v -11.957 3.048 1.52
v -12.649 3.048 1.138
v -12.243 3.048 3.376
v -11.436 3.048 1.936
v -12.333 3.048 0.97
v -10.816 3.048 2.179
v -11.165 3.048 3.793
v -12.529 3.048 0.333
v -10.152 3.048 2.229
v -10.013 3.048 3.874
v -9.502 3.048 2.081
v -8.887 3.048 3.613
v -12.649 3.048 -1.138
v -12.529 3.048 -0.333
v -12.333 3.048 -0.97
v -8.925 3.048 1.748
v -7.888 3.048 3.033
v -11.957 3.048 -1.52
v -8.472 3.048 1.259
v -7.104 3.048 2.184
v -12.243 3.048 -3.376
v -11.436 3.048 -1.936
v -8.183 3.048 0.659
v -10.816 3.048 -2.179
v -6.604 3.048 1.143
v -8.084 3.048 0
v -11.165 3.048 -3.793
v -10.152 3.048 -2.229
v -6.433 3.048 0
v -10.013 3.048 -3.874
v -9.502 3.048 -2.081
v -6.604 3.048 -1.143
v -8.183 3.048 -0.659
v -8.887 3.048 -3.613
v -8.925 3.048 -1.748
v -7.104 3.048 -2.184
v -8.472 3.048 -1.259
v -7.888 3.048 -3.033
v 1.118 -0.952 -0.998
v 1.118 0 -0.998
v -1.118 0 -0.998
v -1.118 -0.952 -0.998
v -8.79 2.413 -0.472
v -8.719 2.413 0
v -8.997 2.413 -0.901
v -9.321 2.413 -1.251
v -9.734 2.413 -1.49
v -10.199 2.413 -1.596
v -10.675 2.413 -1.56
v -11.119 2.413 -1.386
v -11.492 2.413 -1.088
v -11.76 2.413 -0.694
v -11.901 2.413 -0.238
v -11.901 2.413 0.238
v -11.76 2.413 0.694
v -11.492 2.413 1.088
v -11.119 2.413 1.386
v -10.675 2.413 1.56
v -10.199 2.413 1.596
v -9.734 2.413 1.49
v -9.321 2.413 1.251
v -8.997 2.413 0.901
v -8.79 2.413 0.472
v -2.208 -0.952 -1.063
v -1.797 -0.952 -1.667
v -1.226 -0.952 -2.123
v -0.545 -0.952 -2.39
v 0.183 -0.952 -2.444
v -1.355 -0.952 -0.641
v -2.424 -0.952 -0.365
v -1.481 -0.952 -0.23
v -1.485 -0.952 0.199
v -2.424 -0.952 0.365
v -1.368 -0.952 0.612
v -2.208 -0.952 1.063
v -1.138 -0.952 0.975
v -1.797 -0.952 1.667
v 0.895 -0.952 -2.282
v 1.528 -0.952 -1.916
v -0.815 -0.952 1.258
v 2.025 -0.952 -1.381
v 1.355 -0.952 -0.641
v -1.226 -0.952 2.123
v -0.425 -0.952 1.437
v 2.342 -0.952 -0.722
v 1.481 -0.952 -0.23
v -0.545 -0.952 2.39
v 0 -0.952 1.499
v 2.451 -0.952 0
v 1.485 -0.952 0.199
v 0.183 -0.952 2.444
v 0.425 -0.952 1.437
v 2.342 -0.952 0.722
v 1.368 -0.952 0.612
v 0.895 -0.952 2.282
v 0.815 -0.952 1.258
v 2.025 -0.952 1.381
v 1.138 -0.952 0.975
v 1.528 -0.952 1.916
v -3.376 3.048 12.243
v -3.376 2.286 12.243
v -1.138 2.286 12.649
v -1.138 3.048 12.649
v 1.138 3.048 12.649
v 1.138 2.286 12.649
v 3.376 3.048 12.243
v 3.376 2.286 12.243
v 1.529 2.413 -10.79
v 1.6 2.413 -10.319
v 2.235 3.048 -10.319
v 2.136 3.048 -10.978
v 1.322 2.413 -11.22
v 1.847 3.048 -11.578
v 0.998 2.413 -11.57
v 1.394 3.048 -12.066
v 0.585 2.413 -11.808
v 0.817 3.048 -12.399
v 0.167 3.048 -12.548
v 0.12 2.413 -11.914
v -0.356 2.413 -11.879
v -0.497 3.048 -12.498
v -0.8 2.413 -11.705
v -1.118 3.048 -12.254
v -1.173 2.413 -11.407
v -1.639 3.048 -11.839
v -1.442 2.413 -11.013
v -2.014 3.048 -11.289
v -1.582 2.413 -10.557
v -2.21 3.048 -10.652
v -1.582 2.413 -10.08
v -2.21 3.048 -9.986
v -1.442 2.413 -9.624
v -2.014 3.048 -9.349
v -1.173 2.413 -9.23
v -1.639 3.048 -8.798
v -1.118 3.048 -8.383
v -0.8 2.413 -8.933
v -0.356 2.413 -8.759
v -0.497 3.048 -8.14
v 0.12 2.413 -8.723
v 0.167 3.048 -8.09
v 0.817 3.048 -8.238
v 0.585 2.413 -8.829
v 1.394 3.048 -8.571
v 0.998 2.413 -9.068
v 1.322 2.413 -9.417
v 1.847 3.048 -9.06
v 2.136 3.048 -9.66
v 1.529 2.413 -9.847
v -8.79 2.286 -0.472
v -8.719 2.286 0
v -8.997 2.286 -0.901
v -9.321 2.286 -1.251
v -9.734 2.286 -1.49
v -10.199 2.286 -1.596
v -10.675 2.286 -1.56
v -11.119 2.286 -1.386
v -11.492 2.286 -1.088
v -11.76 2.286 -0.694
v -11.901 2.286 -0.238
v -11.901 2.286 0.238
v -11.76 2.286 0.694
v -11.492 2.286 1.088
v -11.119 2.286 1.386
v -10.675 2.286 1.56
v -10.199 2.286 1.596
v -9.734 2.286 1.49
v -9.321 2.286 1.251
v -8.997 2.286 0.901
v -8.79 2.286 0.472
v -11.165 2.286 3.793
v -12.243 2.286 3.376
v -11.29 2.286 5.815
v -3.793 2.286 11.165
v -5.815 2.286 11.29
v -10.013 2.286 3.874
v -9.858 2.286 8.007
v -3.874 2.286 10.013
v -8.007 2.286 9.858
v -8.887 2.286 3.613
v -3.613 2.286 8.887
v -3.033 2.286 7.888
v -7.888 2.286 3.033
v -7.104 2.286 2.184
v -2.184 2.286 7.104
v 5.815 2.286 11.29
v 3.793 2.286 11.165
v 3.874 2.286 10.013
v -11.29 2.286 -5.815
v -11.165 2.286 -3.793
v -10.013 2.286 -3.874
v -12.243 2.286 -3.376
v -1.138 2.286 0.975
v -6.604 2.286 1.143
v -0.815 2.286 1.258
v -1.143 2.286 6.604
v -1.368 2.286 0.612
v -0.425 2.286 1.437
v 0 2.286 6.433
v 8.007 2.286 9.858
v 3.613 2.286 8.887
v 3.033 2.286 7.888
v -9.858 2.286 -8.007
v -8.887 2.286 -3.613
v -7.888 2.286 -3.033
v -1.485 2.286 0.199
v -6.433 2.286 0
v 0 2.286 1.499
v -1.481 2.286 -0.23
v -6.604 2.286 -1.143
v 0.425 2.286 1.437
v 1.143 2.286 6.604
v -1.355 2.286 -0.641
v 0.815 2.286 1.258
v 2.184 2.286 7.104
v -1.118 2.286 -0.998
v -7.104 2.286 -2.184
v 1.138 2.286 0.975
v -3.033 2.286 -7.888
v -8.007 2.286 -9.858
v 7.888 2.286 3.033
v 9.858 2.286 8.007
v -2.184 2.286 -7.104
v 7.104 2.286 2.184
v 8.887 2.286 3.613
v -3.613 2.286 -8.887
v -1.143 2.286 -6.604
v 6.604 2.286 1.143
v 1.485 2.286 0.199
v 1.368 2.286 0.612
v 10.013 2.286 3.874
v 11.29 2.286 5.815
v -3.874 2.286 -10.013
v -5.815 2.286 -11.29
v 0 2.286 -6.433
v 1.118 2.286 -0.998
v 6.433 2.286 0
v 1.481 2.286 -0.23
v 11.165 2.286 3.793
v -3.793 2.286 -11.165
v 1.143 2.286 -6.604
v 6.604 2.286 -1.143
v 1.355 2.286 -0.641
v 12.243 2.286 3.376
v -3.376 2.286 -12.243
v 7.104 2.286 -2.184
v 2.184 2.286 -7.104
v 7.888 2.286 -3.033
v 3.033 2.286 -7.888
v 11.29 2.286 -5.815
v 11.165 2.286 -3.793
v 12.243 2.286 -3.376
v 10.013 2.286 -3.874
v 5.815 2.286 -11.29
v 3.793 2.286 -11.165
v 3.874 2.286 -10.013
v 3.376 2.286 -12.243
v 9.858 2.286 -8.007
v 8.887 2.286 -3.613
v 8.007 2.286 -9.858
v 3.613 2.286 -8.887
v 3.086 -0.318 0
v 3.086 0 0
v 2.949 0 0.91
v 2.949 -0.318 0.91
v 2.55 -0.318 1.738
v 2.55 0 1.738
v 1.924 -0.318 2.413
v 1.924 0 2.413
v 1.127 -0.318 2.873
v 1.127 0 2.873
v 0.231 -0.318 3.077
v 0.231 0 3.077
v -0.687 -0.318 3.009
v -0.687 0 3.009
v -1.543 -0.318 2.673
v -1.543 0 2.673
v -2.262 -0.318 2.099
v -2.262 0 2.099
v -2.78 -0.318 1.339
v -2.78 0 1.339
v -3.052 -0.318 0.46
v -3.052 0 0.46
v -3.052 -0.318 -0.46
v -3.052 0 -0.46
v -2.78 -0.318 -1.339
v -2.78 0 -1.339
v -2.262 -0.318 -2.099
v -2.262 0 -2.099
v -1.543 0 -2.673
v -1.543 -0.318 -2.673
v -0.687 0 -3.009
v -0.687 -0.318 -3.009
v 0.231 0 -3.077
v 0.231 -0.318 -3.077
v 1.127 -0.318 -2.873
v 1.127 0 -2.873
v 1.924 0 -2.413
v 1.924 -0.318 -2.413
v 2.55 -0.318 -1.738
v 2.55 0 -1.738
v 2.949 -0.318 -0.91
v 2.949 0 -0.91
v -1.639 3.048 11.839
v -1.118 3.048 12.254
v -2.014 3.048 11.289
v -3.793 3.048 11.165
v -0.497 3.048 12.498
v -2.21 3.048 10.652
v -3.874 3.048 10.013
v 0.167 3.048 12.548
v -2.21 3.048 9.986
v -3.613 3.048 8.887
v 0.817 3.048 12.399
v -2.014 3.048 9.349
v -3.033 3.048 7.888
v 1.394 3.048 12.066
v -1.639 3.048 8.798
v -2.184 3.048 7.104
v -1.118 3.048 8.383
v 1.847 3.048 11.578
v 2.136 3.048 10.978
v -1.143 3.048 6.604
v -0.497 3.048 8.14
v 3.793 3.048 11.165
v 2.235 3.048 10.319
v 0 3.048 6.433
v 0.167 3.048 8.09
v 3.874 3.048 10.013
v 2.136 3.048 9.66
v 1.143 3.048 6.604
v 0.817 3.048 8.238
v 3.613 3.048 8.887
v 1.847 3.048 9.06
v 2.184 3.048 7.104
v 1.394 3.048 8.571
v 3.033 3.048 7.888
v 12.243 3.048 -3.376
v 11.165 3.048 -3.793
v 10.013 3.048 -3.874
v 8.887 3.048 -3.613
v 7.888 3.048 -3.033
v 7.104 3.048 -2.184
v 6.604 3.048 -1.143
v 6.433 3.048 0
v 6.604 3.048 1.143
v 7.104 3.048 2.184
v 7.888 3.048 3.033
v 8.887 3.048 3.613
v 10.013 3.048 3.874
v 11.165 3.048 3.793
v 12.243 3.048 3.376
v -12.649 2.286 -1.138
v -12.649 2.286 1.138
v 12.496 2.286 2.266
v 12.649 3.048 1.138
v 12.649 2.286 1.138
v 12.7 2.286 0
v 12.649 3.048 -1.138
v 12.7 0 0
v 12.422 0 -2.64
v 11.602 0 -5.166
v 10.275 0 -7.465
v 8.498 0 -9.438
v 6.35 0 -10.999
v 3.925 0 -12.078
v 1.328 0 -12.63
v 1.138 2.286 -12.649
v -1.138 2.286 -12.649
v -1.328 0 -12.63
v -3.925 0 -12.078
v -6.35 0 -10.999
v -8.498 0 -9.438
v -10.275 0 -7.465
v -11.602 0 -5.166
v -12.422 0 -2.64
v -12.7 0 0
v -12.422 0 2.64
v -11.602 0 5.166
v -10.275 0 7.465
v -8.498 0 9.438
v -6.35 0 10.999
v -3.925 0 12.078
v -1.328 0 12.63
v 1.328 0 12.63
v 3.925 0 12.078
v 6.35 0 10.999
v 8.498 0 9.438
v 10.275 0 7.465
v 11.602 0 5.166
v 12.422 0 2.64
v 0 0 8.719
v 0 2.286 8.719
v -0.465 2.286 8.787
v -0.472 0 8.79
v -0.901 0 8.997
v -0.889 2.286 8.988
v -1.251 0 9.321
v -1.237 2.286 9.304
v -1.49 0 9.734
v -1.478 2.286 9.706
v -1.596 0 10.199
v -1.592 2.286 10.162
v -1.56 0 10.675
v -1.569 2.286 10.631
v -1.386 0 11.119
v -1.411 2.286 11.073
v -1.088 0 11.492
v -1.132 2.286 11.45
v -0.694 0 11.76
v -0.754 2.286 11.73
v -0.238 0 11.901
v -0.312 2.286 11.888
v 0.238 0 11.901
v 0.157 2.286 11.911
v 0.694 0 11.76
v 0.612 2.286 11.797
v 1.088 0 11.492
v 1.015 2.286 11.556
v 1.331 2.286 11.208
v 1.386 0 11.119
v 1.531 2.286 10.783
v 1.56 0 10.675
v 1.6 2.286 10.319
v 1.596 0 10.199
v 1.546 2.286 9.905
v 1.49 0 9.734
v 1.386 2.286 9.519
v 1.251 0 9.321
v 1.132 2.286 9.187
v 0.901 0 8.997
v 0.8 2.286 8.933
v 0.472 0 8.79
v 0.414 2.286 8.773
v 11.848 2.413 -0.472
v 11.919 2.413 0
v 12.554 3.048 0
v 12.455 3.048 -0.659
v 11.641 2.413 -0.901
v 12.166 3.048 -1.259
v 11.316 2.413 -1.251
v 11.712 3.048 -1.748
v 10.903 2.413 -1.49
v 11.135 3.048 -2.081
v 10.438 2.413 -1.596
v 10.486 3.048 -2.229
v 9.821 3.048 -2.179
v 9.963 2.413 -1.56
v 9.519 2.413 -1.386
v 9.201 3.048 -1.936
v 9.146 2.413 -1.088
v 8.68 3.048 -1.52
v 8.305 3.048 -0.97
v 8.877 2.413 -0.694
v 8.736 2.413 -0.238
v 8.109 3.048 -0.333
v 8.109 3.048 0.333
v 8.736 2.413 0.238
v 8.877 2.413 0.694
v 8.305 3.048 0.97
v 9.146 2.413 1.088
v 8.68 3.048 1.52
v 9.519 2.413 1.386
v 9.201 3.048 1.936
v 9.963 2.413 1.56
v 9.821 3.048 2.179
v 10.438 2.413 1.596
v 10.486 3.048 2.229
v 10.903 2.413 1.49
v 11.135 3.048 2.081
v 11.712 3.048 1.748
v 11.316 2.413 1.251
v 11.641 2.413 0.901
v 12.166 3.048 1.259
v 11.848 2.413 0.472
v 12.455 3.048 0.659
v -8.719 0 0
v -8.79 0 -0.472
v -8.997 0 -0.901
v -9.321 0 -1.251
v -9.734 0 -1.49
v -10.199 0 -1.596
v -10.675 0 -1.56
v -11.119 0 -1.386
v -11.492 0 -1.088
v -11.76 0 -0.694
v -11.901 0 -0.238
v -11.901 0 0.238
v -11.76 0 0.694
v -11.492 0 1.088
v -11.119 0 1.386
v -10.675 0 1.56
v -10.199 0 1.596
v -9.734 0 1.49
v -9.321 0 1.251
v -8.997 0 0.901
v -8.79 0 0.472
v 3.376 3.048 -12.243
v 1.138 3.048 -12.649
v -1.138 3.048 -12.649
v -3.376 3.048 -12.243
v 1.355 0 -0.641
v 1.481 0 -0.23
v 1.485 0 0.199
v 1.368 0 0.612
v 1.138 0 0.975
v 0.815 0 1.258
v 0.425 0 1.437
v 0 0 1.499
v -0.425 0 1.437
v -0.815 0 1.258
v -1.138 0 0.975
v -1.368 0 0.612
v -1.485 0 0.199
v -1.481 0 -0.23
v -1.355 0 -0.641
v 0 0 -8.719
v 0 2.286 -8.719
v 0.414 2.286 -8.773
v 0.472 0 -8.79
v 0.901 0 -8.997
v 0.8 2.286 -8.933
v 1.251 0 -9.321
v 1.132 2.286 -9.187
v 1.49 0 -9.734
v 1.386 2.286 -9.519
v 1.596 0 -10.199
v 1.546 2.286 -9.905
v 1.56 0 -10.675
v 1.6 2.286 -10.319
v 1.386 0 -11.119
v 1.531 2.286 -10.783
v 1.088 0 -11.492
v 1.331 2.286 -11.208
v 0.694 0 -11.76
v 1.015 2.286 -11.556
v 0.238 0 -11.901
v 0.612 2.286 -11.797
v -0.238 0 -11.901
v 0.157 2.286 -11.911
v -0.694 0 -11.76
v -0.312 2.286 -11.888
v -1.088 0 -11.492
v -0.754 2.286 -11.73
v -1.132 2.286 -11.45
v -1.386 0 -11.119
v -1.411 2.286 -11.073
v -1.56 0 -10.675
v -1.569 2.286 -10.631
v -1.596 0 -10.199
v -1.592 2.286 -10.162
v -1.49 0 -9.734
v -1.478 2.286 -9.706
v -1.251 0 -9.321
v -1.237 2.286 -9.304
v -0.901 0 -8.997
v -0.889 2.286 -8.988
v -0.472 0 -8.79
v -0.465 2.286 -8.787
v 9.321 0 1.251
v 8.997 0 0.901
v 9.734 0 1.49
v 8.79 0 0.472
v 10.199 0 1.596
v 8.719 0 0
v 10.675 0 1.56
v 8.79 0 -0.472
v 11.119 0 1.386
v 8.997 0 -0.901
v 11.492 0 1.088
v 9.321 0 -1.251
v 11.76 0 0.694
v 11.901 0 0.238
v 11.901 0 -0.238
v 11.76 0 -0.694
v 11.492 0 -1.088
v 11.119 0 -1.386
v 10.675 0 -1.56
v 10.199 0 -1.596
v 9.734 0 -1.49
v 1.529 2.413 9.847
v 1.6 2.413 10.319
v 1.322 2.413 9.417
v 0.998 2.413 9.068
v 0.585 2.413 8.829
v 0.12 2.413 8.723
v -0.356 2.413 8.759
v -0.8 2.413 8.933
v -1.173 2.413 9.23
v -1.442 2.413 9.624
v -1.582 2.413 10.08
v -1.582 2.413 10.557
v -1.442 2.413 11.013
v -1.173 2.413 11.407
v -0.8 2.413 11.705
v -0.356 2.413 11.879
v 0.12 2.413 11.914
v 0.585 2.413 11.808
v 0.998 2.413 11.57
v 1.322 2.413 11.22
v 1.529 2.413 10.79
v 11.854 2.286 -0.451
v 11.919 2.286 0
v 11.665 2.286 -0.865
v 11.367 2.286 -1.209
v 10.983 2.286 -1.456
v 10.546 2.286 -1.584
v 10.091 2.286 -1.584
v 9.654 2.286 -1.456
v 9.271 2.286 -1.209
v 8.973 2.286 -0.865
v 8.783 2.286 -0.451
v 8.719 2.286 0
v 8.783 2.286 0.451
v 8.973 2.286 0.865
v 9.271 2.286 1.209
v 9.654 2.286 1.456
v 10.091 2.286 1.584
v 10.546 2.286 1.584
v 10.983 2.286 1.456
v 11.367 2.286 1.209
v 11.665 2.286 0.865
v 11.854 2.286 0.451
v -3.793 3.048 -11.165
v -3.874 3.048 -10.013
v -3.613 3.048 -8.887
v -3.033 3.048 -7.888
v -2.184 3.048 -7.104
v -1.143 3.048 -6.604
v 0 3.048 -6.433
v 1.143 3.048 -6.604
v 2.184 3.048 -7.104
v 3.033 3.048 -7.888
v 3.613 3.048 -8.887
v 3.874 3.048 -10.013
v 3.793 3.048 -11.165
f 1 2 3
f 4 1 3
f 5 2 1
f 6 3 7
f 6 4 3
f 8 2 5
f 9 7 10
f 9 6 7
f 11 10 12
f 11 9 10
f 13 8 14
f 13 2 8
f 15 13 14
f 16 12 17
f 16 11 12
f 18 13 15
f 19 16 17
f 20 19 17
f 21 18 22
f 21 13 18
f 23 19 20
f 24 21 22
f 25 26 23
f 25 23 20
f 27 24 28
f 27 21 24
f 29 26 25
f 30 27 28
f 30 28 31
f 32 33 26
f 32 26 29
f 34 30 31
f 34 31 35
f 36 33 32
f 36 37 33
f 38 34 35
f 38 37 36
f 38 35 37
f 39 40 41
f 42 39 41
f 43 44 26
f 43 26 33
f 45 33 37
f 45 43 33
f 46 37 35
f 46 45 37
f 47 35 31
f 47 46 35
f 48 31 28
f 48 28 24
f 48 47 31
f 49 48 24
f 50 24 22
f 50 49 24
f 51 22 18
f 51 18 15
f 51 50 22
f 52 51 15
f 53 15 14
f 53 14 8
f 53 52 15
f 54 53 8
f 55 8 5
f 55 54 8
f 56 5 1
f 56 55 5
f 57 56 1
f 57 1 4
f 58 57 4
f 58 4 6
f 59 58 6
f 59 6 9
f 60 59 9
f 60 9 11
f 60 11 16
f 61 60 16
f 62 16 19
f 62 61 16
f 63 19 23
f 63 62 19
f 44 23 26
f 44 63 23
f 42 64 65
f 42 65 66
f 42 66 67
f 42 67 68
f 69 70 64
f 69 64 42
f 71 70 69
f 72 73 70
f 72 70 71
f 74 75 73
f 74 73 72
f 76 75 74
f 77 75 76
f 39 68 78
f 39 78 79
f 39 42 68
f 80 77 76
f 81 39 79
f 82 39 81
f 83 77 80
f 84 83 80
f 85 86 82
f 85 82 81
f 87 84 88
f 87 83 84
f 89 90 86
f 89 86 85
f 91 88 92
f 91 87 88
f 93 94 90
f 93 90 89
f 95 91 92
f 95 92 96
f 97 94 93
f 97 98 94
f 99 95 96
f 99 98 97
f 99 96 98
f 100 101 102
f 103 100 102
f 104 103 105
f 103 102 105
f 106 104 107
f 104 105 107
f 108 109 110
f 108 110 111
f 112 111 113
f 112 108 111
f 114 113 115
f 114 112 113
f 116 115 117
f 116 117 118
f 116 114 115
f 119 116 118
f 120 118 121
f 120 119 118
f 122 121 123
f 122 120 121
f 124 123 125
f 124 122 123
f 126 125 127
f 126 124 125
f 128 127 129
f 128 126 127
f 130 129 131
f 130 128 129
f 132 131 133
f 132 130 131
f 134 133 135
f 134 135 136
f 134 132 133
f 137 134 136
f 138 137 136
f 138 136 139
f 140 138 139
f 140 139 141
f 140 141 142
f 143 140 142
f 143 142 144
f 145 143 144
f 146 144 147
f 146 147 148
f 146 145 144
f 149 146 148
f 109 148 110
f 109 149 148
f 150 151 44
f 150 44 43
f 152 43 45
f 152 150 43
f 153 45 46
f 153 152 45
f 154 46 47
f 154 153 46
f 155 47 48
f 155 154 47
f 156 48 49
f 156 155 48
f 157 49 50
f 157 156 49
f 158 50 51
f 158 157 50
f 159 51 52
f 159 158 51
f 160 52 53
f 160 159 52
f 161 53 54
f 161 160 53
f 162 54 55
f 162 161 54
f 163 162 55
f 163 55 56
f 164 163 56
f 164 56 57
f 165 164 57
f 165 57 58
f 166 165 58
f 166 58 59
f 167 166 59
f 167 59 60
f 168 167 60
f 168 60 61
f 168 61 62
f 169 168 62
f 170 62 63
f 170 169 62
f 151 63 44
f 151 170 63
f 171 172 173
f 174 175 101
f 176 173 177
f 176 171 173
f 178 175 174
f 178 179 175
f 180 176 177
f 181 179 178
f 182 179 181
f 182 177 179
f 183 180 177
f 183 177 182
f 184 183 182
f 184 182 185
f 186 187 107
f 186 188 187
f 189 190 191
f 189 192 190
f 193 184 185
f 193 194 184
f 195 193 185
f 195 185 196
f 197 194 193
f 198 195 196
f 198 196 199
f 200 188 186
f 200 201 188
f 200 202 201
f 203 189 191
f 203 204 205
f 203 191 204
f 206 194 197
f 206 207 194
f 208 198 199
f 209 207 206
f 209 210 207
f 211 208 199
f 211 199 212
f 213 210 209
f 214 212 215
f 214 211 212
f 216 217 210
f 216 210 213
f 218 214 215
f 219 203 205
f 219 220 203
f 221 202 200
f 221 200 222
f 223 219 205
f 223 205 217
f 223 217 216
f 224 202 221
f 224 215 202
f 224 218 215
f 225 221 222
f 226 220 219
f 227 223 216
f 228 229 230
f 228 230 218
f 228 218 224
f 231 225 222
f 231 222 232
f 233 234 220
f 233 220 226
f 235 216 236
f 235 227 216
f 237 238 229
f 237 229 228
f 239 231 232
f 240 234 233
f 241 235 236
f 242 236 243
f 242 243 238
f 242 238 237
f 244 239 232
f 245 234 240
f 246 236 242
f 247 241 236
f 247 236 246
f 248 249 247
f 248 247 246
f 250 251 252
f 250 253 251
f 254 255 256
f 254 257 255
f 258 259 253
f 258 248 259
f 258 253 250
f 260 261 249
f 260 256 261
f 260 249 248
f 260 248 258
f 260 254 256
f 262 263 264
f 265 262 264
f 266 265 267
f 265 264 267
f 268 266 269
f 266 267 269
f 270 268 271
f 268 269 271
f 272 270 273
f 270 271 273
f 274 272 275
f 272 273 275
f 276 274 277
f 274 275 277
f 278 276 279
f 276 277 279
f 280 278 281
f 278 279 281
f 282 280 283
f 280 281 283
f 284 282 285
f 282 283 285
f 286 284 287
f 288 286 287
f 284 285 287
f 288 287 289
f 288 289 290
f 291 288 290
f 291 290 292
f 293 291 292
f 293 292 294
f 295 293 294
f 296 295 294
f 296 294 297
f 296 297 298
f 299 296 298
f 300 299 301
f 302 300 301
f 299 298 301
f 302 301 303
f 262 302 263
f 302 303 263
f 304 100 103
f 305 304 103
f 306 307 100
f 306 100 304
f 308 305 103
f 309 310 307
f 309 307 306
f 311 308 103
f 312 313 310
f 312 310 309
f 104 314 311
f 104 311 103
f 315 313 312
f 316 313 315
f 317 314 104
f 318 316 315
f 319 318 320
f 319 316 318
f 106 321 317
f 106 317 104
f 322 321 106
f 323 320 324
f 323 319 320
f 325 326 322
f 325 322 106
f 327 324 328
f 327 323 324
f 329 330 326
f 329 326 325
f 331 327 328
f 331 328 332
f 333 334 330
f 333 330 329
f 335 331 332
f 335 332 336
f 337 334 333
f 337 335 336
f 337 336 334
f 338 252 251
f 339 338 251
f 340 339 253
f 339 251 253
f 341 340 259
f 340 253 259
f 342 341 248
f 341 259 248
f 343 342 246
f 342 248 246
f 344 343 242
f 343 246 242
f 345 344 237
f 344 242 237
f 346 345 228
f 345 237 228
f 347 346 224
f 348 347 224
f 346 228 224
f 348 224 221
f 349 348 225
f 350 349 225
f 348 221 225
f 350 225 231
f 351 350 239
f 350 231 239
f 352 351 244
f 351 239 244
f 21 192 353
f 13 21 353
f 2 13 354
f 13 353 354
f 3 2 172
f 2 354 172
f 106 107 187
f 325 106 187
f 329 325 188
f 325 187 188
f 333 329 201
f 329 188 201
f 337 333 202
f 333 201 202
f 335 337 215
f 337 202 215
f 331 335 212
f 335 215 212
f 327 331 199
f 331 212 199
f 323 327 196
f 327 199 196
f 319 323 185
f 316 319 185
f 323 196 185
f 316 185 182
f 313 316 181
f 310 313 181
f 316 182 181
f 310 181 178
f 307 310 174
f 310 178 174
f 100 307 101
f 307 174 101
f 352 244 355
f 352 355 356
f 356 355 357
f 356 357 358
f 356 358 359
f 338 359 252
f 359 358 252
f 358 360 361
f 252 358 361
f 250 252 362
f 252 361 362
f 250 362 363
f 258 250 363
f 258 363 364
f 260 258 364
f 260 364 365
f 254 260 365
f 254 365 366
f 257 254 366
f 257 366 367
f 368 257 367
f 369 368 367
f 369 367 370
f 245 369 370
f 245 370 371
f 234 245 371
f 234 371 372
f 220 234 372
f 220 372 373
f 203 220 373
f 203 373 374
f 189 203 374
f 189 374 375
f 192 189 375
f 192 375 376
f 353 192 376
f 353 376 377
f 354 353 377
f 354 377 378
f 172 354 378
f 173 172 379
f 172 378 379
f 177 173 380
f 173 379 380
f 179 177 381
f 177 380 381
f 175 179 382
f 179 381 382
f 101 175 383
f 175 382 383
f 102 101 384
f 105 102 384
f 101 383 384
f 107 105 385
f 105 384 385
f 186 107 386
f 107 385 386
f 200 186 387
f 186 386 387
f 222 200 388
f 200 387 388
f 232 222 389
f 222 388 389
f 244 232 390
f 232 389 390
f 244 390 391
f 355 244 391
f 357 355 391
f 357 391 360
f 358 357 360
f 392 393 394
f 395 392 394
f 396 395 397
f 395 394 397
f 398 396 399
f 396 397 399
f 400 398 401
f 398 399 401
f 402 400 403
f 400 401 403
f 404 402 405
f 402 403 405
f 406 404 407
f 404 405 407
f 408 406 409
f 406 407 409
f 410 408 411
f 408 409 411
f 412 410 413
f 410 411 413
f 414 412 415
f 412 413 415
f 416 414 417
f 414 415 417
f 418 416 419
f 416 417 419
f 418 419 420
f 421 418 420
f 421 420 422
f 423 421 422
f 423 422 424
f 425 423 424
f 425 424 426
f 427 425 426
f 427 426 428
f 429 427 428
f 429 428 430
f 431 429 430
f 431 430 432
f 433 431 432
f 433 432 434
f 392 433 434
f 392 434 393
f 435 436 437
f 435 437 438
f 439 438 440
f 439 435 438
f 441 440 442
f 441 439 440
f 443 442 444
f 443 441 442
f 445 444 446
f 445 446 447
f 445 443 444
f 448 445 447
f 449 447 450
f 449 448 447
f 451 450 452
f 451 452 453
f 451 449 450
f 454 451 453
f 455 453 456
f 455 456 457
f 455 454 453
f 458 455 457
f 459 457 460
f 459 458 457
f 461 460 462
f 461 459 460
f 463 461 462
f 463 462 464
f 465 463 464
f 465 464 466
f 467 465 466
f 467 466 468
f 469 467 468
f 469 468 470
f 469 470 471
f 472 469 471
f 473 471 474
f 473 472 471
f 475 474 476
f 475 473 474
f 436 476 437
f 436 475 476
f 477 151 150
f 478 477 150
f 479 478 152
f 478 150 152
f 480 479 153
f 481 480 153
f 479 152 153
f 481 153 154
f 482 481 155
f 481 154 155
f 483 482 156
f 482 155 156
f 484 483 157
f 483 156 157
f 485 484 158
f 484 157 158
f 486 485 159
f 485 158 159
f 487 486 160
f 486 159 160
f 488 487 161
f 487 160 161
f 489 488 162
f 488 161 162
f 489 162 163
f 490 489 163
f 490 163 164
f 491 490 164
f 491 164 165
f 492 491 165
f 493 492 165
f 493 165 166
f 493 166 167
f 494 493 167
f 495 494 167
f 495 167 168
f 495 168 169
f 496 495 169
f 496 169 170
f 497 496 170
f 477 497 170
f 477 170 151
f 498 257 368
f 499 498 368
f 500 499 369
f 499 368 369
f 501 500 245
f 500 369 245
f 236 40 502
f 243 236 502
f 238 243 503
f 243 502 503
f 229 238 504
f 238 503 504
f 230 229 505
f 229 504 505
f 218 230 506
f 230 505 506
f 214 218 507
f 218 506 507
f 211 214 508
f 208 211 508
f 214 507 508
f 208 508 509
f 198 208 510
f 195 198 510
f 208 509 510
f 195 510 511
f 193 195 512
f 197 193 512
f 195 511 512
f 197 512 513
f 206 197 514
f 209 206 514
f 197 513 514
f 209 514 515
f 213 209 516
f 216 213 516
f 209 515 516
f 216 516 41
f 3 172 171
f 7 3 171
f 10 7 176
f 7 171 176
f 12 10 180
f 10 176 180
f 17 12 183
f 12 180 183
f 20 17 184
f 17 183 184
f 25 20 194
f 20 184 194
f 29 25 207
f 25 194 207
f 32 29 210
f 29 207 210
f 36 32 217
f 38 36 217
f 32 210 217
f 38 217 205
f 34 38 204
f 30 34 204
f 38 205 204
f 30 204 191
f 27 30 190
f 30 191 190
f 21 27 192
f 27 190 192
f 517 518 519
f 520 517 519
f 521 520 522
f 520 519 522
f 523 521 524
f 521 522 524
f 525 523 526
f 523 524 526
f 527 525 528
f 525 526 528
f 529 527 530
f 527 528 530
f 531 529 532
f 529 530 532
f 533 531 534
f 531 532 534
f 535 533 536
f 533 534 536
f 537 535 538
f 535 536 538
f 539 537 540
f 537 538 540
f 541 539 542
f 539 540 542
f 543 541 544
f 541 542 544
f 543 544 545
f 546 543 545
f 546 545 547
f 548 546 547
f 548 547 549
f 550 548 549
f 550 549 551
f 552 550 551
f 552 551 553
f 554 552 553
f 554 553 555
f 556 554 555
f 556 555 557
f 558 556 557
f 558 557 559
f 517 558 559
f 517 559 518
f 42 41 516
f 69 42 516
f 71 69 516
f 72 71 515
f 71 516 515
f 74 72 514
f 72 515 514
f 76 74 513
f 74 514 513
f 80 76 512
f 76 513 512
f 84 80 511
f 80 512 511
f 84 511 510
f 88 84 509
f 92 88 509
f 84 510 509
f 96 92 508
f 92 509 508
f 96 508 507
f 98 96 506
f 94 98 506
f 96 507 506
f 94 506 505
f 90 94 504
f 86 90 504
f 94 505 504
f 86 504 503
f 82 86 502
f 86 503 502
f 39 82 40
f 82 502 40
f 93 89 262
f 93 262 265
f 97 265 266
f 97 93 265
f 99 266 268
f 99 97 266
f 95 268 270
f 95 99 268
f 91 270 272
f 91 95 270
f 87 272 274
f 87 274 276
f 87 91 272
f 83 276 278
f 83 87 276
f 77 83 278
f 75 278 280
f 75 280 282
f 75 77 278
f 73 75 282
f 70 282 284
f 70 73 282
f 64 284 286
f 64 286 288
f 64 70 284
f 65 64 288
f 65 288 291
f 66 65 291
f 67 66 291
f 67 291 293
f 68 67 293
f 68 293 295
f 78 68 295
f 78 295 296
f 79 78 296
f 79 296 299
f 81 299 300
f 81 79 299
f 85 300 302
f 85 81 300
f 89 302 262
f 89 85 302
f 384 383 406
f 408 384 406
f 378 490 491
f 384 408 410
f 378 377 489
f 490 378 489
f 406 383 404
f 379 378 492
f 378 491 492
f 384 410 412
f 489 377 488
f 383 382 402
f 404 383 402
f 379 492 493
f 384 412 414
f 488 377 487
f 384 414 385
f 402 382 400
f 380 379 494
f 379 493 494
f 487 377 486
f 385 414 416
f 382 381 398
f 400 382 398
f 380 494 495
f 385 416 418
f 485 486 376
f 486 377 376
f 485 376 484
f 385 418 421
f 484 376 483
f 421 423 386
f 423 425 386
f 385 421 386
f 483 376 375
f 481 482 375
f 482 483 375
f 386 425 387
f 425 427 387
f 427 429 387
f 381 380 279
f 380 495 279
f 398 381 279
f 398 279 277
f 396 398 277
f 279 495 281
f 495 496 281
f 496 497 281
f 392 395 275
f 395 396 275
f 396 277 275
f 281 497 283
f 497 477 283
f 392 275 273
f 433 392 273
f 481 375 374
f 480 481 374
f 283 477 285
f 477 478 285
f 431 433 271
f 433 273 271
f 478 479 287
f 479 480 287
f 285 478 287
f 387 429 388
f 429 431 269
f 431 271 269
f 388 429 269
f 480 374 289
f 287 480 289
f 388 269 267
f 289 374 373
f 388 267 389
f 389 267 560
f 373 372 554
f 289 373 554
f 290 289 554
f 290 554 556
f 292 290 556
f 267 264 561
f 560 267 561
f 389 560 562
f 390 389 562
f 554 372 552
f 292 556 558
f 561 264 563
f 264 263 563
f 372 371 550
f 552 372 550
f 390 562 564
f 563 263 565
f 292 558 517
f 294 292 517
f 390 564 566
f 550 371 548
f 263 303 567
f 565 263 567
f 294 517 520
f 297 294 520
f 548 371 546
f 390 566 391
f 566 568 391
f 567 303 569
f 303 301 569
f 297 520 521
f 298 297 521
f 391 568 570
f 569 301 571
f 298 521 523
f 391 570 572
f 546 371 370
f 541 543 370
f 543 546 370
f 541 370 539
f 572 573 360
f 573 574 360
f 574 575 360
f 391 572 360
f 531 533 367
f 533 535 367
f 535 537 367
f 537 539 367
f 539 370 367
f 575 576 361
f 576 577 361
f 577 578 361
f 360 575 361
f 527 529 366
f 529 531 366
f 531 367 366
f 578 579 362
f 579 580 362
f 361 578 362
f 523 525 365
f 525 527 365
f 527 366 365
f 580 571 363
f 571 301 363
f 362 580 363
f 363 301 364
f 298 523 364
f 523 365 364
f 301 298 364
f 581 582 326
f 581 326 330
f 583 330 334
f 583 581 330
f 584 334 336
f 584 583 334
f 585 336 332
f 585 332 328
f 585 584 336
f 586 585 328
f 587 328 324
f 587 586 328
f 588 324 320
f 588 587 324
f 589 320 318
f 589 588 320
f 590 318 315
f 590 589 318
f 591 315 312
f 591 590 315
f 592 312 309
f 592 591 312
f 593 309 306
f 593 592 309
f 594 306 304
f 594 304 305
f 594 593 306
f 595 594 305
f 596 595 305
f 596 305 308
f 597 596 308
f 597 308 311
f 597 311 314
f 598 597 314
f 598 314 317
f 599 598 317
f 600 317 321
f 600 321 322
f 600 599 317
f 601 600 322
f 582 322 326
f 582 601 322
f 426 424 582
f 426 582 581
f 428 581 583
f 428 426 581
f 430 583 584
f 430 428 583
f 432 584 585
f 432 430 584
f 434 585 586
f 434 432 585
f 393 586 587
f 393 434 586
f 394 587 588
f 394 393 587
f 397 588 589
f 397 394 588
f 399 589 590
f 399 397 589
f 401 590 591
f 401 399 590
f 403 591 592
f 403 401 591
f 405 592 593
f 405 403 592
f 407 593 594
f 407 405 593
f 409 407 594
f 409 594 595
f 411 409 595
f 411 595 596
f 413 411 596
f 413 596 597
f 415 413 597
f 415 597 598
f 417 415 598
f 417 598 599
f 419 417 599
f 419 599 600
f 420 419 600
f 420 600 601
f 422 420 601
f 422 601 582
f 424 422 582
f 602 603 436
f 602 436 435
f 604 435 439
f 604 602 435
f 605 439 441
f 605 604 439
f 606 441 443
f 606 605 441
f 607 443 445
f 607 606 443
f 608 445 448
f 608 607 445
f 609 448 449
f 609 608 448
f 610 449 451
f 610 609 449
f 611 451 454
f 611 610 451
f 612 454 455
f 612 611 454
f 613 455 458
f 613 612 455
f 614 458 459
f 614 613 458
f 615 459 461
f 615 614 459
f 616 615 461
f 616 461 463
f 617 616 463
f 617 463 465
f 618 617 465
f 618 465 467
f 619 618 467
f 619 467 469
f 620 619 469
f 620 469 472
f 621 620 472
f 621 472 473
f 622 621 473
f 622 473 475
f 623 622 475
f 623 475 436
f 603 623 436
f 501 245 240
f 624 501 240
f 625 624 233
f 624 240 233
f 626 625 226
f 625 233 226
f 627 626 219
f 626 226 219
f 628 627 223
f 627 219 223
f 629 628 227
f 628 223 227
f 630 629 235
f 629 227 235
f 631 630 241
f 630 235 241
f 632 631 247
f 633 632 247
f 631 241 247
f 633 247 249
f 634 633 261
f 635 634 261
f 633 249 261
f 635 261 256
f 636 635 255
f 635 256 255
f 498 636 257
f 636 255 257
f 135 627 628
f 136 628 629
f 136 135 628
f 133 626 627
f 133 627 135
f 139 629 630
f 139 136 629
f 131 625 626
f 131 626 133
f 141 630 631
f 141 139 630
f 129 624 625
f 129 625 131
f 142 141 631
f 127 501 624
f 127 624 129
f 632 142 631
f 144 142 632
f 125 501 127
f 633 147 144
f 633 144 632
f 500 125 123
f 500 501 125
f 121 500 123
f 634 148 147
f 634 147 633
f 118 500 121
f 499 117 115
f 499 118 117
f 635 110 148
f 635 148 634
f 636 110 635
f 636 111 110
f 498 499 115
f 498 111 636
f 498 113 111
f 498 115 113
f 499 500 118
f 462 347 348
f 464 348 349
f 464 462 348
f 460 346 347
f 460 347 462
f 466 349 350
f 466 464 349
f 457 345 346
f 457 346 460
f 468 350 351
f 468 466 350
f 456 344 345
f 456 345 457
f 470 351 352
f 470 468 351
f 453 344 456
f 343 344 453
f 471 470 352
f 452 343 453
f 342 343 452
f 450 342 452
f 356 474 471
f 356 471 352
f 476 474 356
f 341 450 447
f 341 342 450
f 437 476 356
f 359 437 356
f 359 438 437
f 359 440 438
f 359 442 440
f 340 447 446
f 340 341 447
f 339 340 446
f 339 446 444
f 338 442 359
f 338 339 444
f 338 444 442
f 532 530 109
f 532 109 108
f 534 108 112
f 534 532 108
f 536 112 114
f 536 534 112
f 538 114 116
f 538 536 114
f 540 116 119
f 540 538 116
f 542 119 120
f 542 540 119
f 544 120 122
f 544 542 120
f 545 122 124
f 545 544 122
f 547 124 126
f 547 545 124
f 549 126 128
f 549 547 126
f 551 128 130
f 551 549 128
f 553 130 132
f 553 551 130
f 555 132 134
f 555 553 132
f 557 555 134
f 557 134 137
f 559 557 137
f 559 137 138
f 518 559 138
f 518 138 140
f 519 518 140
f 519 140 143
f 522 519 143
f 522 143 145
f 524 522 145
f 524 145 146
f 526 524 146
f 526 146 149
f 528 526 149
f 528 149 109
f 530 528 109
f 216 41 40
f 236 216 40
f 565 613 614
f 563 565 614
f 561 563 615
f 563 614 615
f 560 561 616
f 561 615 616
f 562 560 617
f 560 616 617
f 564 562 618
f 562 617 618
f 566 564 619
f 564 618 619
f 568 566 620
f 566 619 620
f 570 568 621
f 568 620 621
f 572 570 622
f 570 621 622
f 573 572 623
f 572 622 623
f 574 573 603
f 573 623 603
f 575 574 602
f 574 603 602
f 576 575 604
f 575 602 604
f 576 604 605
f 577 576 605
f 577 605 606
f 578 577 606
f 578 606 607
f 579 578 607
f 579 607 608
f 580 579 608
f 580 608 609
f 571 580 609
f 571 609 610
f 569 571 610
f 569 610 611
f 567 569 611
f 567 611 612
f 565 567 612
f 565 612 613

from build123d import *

# Parameters (mm, degrees)
SKETCH1_R           = 12.7
BOSS_EXTRUDE1_DEPTH = 2.286
SKETCH2_R           = 1.6002
CUT_EXTRUDE1_DEPTH  = 3.286
CIRPATTERN1_COUNT   = 4
SKETCH4_R           = 1.6002
BOSS_EXTRUDE3_DEPTH = 0.762
CHAMFER1_SIZE       = 0.635
SKETCH5_R           = 3.0861
BOSS_EXTRUDE4_DEPTH = 0.9525
CHAMFER2_SIZE       = 0.635


with BuildPart() as part:
    # Sketch1 → Boss-Extrude1 (new body)
    with BuildSketch(Plane(origin=(0, 0, 0), x_dir=(1, 0, 0), z_dir=(0, 1, 0))):
        Circle(SKETCH1_R)
        with BuildLine():
            Line((-1.1176, 0.998384796), (1.1176, 0.998384796))
            ThreePointArc((1.1176, 0.998384796), (0, -1.4986), (-1.1176, 0.998384796))
        make_face(mode=Mode.SUBTRACT)
    extrude(amount=BOSS_EXTRUDE1_DEPTH)

    # Sketch2 → Cut-Extrude1 (cut, through all)
    with BuildSketch(Plane(origin=(0, 2.286, 0), x_dir=(1, 0, 0), z_dir=(0, 1, 0))):
        with Locations((-10.31875, 0)):
            Circle(SKETCH2_R)
    cut_extrude1 = extrude(amount=-CUT_EXTRUDE1_DEPTH, mode=Mode.SUBTRACT)

    # CirPattern1: Cut-Extrude1 ×4 about axis
    cirpattern1_axis = Axis((0, 0, 0), (0, 1, 0))
    for i in range(1, CIRPATTERN1_COUNT):
        add(cut_extrude1.rotate(cirpattern1_axis, i * 360 / CIRPATTERN1_COUNT), mode=Mode.SUBTRACT)

    # Sketch4 → Boss-Extrude3 (add)
    with BuildSketch(Plane(origin=(0, 2.286, 0), x_dir=(1, 0, 0), z_dir=(0, 1, 0))):
        with BuildLine():
            ThreePointArc((-12.242958262, -3.376384606), (-6.43255, 0), (-12.242958262, 3.376384606))
            ThreePointArc((-12.242958262, 3.376384606), (-12.7, 0), (-12.242958262, -3.376384606))
        make_face()
        with Locations((-10.31875, 0)):
            Circle(SKETCH4_R, mode=Mode.SUBTRACT)
        with BuildLine():
            ThreePointArc((-3.376384606, 12.242958262), (0, 6.43255), (3.376384606, 12.242958262))
            ThreePointArc((3.376384606, 12.242958262), (0, 12.7), (-3.376384606, 12.242958262))
        make_face()
        with Locations((0, 10.31875)):
            Circle(SKETCH4_R, mode=Mode.SUBTRACT)
        with BuildLine():
            ThreePointArc((12.242958262, 3.376384606), (6.43255, 0), (12.242958262, -3.376384606))
            ThreePointArc((12.242958262, -3.376384606), (12.7, 0), (12.242958262, 3.376384606))
        make_face()
        with Locations((10.31875, 0)):
            Circle(SKETCH4_R, mode=Mode.SUBTRACT)
        with BuildLine():
            ThreePointArc((3.376384606, -12.242958262), (0, -6.43255), (-3.376384606, -12.242958262))
            ThreePointArc((-3.376384606, -12.242958262), (0, -12.7), (3.376384606, -12.242958262))
        make_face()
        with Locations((0, -10.31875)):
            Circle(SKETCH4_R, mode=Mode.SUBTRACT)
    extrude(amount=BOSS_EXTRUDE3_DEPTH)

    # Chamfer1
    chamfer1_edges = [part.edges().sort_by_distance(p)[0] for p in [
        (-1.6002, 3.048, -10.31875),
        (8.71855, 3.048, 0),
        (-11.91895, 3.048, 0),
        (-1.6002, 3.048, 10.31875),
    ]]
    chamfer(chamfer1_edges, length=CHAMFER1_SIZE)

    # Sketch5 → Boss-Extrude4 (add)
    with BuildSketch(Plane.XZ):
        Circle(SKETCH5_R)
        with BuildLine():
            Line((1.1176, -0.998384796), (-1.1176, -0.998384796))
            ThreePointArc((-1.1176, -0.998384796), (0, 1.4986), (1.1176, -0.998384796))
        make_face(mode=Mode.SUBTRACT)
    extrude(amount=BOSS_EXTRUDE4_DEPTH)

    # Chamfer2
    chamfer2_edges = [part.edges().sort_by_distance(p)[0] for p in [
        (-3.0861, -0.9525, 0),
    ]]
    chamfer(chamfer2_edges, length=CHAMFER2_SIZE)


solid = part.part
